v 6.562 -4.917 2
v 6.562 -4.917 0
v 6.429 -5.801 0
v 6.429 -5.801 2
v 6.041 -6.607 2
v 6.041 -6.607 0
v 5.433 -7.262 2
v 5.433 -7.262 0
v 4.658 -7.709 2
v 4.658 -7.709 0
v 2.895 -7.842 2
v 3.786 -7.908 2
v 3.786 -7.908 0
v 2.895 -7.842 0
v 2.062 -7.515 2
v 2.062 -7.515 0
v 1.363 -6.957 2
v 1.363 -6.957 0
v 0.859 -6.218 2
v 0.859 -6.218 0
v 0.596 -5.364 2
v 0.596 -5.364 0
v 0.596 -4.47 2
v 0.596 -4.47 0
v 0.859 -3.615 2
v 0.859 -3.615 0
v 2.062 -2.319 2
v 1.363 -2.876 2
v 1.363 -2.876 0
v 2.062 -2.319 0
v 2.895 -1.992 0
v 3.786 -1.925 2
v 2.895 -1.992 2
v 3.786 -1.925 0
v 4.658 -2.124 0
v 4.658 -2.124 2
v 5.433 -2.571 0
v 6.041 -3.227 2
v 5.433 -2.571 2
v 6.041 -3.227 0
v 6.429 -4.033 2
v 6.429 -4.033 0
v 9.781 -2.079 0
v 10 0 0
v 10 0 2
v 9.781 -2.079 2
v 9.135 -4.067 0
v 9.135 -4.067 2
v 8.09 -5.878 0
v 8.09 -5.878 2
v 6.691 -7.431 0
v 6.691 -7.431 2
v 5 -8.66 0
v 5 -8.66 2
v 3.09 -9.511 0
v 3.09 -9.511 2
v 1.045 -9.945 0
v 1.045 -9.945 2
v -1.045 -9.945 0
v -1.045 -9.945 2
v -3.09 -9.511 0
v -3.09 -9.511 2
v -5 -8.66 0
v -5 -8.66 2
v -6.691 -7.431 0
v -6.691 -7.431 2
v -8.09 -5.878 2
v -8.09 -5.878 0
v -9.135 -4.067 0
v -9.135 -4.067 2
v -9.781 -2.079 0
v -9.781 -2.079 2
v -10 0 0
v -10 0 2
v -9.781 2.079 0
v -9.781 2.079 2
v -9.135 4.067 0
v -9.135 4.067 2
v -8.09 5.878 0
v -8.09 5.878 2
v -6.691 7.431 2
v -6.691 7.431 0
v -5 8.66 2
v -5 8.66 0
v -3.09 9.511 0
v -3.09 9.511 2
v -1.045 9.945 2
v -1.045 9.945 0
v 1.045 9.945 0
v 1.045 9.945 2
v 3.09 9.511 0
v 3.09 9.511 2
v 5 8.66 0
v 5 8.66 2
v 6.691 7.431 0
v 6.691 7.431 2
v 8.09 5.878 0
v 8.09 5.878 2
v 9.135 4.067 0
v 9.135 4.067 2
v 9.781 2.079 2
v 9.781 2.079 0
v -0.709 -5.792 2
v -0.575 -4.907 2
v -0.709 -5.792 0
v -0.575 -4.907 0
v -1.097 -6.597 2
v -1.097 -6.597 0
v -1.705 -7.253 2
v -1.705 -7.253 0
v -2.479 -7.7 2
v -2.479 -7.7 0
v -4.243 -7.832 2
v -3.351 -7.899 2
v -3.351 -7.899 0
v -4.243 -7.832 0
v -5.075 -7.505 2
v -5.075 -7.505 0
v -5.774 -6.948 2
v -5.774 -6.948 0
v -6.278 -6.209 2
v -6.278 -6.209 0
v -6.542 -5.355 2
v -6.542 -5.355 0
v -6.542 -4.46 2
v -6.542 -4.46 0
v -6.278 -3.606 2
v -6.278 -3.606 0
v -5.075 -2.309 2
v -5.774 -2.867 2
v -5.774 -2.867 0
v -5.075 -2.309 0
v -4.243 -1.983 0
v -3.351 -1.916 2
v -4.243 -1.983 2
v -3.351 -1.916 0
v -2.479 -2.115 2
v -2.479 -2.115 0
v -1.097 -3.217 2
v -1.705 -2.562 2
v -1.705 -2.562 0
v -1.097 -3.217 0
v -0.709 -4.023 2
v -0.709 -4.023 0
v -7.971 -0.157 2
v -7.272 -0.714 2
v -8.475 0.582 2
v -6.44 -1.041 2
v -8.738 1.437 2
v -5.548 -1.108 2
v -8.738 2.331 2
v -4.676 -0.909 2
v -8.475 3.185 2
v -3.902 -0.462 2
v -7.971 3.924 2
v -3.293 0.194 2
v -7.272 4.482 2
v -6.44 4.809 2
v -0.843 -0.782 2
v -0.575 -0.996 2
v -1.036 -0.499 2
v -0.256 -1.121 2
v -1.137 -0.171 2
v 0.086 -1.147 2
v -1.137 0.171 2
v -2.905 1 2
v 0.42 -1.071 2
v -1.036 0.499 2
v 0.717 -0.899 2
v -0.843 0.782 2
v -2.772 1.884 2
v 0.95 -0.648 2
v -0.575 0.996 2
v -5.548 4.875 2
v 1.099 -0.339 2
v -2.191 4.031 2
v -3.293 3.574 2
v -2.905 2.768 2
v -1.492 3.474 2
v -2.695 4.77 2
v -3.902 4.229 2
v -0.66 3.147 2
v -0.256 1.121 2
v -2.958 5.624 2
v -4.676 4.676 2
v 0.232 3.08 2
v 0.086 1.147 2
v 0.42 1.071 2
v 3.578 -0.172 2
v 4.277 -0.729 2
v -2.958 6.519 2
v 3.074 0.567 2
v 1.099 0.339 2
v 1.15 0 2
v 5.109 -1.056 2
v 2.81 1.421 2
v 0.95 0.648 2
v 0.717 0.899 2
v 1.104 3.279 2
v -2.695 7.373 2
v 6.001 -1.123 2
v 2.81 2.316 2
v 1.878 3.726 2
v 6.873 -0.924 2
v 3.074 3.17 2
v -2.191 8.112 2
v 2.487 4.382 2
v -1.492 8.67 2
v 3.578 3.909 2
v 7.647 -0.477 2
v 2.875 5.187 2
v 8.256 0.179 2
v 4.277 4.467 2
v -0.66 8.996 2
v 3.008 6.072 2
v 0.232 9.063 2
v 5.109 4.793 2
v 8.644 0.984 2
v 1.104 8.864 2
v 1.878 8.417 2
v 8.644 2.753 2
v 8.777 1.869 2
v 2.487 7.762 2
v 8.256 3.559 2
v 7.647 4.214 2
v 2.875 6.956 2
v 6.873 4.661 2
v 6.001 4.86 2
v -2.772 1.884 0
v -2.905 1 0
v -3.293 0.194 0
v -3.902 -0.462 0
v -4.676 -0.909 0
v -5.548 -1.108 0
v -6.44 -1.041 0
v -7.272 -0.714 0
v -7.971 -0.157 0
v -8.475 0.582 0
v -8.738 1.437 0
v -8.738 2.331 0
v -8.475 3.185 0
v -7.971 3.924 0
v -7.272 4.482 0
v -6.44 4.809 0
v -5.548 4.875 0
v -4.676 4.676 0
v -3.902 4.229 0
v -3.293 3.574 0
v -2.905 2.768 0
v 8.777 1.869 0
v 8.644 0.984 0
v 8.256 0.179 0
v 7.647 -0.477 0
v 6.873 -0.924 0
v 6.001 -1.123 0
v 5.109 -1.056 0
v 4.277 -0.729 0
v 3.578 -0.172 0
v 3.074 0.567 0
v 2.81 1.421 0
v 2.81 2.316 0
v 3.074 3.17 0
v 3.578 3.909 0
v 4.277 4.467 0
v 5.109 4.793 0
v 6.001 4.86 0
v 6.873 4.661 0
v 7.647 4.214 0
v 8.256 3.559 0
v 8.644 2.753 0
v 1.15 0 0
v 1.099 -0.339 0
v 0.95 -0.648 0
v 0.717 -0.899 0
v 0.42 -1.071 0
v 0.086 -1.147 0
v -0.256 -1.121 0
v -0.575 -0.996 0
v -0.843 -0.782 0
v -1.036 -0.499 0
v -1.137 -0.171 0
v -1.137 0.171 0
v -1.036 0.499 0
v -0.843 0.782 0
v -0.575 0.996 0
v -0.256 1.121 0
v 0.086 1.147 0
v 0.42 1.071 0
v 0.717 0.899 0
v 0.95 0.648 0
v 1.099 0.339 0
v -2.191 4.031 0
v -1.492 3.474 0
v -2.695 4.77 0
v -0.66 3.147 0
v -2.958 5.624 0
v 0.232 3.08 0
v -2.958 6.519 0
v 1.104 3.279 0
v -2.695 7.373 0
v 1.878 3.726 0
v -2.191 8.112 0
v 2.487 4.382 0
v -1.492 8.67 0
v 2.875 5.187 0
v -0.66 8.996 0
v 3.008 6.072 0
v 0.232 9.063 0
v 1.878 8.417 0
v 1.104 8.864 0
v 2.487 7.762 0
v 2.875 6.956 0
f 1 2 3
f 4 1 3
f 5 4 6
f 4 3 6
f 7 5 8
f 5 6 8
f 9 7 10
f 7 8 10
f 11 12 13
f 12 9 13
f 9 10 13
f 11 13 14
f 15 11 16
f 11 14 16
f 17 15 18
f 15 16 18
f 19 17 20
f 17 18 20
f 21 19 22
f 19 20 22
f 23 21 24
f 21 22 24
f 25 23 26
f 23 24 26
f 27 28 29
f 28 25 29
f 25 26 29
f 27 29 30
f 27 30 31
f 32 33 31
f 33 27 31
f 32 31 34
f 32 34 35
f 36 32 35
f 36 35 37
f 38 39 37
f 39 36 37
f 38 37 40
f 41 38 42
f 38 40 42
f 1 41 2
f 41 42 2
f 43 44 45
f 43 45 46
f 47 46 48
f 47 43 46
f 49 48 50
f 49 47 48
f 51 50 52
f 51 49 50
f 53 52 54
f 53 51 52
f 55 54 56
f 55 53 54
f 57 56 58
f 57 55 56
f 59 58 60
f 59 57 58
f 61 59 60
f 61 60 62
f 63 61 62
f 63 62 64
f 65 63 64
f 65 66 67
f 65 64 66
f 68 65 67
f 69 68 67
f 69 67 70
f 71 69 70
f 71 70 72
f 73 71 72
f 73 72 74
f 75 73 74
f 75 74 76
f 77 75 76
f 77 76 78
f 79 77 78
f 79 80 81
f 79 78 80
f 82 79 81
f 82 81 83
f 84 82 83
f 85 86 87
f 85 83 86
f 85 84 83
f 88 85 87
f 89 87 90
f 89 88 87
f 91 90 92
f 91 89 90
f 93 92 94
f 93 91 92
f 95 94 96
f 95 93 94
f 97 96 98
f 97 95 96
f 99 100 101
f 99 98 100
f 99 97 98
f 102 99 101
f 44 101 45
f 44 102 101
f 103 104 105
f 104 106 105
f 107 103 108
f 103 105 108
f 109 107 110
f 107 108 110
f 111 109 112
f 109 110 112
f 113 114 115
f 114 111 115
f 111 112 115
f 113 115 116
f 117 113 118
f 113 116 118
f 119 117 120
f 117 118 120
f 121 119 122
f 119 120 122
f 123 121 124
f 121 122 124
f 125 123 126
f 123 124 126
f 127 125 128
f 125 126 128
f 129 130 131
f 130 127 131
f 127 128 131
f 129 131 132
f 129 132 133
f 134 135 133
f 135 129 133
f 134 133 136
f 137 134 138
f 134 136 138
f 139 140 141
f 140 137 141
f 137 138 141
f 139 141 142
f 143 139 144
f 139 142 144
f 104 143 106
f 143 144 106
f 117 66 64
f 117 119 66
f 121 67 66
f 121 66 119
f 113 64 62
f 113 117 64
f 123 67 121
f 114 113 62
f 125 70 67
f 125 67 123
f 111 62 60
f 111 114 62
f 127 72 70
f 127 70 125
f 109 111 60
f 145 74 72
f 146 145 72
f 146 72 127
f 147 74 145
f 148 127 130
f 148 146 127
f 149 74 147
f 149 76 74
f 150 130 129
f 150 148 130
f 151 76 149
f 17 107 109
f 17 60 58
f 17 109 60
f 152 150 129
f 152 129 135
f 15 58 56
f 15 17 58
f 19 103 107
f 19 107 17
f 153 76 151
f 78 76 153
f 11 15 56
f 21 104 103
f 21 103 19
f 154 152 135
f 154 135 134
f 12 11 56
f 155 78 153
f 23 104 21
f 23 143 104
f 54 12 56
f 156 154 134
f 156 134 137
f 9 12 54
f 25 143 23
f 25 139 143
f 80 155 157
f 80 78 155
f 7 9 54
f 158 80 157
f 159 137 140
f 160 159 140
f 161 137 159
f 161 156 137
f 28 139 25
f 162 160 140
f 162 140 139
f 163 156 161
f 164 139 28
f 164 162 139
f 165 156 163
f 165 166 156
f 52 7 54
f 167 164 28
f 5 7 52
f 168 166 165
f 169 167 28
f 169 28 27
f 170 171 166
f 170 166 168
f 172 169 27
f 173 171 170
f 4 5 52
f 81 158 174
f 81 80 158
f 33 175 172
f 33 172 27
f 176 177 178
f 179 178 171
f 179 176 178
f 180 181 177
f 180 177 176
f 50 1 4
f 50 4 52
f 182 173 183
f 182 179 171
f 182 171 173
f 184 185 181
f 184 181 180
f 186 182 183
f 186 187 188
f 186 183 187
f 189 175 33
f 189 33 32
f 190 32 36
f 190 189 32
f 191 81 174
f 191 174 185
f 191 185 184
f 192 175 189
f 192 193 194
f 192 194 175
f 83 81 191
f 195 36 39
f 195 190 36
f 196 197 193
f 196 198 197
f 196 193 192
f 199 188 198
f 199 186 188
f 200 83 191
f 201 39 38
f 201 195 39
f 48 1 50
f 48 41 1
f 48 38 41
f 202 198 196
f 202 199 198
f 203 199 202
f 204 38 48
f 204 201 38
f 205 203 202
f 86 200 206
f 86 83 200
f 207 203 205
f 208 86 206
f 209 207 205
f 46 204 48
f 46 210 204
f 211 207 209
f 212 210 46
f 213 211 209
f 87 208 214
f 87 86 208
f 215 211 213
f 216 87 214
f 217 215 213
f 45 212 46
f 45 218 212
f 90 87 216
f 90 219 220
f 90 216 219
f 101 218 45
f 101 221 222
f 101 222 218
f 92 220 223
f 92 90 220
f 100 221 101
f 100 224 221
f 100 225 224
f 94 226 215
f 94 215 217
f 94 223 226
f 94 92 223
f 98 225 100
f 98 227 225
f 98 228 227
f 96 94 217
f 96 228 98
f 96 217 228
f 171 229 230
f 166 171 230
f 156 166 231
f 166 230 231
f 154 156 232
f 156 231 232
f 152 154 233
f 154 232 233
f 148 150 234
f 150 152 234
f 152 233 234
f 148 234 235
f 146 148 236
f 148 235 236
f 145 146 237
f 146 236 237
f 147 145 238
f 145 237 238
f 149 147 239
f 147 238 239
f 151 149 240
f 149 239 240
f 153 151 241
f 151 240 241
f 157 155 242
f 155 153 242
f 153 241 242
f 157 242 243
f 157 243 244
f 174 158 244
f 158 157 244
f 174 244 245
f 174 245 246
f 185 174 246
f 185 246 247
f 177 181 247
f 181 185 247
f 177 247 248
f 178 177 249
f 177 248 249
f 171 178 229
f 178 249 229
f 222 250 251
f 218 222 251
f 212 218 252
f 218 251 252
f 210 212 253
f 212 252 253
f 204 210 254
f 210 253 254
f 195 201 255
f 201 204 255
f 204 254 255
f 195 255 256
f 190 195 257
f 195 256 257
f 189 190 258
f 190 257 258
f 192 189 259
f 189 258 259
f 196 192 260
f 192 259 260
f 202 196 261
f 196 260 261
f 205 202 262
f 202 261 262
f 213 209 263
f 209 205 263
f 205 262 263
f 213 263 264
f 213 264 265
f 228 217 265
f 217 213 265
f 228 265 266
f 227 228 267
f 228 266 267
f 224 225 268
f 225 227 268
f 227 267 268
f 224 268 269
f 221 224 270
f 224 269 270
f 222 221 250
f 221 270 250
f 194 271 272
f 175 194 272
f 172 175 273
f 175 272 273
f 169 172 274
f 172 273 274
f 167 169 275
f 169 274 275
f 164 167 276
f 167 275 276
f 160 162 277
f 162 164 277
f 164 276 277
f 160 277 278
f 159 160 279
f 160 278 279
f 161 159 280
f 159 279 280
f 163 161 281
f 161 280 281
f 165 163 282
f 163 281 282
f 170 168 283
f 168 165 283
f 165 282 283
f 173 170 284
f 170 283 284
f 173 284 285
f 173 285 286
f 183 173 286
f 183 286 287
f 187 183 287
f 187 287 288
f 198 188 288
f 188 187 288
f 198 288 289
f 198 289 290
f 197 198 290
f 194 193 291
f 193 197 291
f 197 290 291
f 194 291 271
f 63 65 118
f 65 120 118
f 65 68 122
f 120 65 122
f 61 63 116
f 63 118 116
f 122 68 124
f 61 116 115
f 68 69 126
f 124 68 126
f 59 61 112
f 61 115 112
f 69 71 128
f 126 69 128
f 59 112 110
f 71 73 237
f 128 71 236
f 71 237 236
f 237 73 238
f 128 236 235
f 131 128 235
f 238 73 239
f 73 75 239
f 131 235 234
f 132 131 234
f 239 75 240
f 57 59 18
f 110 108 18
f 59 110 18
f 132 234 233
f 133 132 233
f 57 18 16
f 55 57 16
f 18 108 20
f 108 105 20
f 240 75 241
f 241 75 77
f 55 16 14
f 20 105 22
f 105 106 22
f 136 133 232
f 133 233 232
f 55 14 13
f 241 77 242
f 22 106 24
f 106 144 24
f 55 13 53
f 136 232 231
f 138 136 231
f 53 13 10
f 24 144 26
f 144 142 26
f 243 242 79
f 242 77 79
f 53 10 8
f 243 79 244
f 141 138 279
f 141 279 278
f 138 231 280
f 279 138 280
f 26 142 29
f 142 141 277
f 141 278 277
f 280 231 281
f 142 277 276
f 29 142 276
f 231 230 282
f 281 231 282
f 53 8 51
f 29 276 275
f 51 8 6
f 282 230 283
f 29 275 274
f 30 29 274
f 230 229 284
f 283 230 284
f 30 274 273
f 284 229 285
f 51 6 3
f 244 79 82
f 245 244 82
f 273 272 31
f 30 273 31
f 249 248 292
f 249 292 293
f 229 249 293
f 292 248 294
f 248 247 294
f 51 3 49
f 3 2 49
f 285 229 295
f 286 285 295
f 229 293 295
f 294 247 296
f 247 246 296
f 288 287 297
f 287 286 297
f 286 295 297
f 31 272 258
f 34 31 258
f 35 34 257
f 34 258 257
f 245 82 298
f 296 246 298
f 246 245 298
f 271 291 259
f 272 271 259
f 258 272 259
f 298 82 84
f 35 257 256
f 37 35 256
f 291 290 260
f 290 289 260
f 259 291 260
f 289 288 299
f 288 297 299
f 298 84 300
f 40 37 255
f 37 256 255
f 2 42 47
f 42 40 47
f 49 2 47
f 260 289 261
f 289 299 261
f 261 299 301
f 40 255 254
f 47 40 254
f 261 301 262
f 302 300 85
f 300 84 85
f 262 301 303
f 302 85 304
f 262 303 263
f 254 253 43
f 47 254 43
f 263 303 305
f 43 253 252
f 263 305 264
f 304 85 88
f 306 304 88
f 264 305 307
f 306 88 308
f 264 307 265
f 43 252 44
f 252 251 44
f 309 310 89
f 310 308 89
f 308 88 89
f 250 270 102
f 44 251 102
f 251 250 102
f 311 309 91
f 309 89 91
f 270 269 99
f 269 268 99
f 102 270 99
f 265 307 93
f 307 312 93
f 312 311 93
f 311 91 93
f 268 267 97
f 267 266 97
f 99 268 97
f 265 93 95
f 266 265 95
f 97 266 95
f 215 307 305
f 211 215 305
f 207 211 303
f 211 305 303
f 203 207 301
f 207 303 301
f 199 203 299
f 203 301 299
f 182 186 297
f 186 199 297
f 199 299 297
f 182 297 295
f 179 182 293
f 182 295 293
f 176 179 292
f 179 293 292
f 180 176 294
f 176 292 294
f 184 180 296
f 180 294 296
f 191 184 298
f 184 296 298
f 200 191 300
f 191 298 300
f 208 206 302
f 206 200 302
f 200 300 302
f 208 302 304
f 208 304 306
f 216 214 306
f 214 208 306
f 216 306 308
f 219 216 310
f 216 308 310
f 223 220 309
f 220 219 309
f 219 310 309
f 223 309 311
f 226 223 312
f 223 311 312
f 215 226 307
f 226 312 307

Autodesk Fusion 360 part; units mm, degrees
sketch "Sketch1" plane through (0, 0, 0) normal (0, 0, 1) x (1, 0, 0)
  circle A0 centre (0, 0) radius 1.15
  circle A1 centre (0, 0) radius 10
  circle A2 centre (0.008, 6.0716) radius 3
  circle A3 centre (-5.772, 1.8838) radius 3
  circle A4 centre (-3.5753, -4.9074) radius 3
  circle A5 centre (3.5623, -4.9168) radius 3
  circle A6 centre (5.7769, 1.8686) radius 3
  dimension "d1" = 2.3
  dimension "d2" = 20
  dimension "d3" = 6
  dimension "d5" = 360
extrude "Extrude1" add sketch "Sketch1" along normal blind 2
